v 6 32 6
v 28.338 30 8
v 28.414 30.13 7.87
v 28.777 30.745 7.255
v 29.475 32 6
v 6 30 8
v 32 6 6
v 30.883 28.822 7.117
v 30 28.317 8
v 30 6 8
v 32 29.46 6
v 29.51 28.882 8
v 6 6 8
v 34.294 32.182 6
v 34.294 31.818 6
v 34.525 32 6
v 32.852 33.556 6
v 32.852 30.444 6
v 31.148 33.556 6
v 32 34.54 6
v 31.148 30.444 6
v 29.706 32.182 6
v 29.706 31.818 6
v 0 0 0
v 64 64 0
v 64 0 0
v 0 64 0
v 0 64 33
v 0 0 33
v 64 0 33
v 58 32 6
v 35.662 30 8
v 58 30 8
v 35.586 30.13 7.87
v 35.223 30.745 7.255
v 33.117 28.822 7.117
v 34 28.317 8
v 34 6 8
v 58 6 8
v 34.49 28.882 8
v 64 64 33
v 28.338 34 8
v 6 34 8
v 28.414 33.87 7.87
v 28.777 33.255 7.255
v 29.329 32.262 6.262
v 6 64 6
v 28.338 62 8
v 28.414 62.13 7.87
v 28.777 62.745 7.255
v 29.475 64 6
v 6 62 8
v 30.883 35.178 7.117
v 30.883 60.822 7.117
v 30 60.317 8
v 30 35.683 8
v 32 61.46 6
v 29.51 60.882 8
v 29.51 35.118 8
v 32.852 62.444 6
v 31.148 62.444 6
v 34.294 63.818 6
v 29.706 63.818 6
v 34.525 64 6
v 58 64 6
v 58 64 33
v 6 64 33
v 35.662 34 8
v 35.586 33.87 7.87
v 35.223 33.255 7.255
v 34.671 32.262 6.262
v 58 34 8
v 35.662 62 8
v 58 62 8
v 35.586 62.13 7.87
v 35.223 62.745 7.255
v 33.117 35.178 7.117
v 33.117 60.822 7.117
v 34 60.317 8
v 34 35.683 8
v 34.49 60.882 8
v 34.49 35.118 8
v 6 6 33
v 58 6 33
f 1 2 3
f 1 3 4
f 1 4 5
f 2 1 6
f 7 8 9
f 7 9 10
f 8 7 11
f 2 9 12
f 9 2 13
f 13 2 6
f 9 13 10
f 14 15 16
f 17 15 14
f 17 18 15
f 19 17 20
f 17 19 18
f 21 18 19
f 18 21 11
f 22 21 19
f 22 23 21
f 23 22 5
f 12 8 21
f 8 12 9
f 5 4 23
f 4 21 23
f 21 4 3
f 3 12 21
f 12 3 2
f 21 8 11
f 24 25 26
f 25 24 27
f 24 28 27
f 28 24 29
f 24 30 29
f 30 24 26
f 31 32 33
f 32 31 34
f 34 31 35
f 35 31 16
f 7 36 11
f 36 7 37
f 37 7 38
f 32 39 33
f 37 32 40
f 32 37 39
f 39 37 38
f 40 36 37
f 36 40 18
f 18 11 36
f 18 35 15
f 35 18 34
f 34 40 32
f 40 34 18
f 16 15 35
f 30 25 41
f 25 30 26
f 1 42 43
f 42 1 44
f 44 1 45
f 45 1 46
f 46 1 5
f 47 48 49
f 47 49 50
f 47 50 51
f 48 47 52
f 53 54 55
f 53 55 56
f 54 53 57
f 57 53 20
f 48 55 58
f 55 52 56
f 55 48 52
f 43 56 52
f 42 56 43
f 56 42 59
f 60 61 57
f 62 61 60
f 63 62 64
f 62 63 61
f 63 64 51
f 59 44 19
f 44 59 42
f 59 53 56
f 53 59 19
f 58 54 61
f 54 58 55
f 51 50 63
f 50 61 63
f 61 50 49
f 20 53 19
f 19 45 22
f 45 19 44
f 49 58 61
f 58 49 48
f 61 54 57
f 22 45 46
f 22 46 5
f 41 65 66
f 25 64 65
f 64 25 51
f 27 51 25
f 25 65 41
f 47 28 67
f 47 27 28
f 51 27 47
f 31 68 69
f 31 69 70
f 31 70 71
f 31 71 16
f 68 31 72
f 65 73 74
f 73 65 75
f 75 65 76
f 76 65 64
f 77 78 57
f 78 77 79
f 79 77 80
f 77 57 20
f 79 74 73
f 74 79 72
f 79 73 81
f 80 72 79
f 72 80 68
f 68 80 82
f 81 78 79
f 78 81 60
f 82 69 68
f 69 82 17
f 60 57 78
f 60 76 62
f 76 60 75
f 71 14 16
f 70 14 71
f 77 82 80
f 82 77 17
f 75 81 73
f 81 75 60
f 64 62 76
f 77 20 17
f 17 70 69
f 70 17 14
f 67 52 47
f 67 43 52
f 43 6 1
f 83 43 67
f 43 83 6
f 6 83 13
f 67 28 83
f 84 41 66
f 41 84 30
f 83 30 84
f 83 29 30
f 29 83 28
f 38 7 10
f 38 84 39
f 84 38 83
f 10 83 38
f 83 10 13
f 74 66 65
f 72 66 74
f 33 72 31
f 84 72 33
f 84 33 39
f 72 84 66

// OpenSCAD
// file: WylochStyleDungeonLibrary.scad
size = 32;
baseheight = 6;
topperheight = 2;
topperrounded = true;
walllength = size;
wallheight = 25 + baseheight + topperheight;
wallwidth = 6;
wallwidththin = 4;

function hypotenuse_ra(side_a, side_b) =
    sqrt(pow(side_a, 2) + pow(side_b, 2));
    
module wsdl_Base(s,bh)
{
    cube([s,s,bh]);
}

module wsdl_Topper(s,bh,th,tr)
{
    if (tr) {
        translate([0,0,bh])
            intersection() {
                difference () {
                        cube([s,s,th]);
                        union () {
                        rotate(a=45, v=[1,0,0])
                            cube([s,th*2,th*2]);
                        translate([0,s,0])
                            rotate(a=45, v=[1,0,0])
                                cube([s,th*2,th*2]);
                        rotate(a=-45, v=[0,1,0])
                            cube([th*2,s,th*2]);
                        translate([s,0,0])
                            rotate(a=-45, v=[0,1,0])
                                cube([th*2,s,th*2]);
                        }
                }
                translate([s/2,s/2,0])
                    cylinder(
                        h=th, 
                        r1=hypotenuse_ra(s/2-1.2, s/2-1.2), 
                        r2=hypotenuse_ra(s/2-th-.8, s/2-th-.8), 
                        center=false, 
                        $fa=.1);
            }    
    }
    else {
        translate([0,0,bh])
            difference() {
                cube([s,s,th]);
                union () {
                rotate(a=45, v=[1,0,0])
                    cube([s,th*2,th*2]);
                translate([0,s,0])
                    rotate(a=45, v=[1,0,0])
                        cube([s,th*2,th*2]);
                rotate(a=-45, v=[0,1,0])
                    cube([th*2,s,th*2]);
                translate([s,0,0])
                    rotate(a=-45, v=[0,1,0])
                        cube([th*2,s,th*2]);
                }
            }    
    }
}

module wsdl_Base_1x1(s,bh,th,tr) 
{
    union () {
        wsdl_Base(s,bh);
        wsdl_Topper(s,bh,th,tr);
    }
}

module wsdl_Base_1x2(s,bh,th,tr)
{
    union () {
        wsdl_Base_1x1(s,bh,th,tr);
        translate([s,0,0])
            wsdl_Base_1x1(s,bh,th,tr);
    }
}
 
module wsdl_Base_2x2(s,bh,th,tr)
{
    union () {
        wsdl_Base_1x2(s,bh,th,tr);
        translate([0,s,0])
            wsdl_Base_1x2(s,bh,th,tr);
    }
}
 
module wsdl_Base_2x4(s,bh,th,tr)
{
    union () {
        wsdl_Base_2x2(s,bh,th,tr);
        translate([s*2,0,0])
            wsdl_Base_2x2(s,bh,th,tr);
    }
}
 
module wsdl_Base_4x4(s,bh,th,tr)
{
    union () {
        wsdl_Base_2x4(s,bh,th,tr);
        translate([0,s*2,0])
            wsdl_Base_2x4(s,bh,th,tr);
    }
}
 
module wsdl_Wall_1(w,l,h)
{
    cube([w,l,h]);   
}

module wsdl_Wall_2(w,l,h)
{
    union() {
        wsdl_Wall_1(w,l,h);
        translate([0,l,0])
            wsdl_Wall_1(w,l,h);
    }
}

module wsdl_Wall_1_Left(w,l,h) 
{
    wsdl_Wall_1(w,l,h);
}

module wsdl_Wall_1_Right(w,l,h) 
{
    translate([(size)-w,0,0])
        wsdl_Wall_1(w,l,h);
}

module wsdl_Wall_1_DoubleRight(w,l,h) 
{
    translate([(size*2)-w,0,0])
        wsdl_Wall_1(w,l,h);
}

module wsdl_Wall_1_Bottom(w,l,h) 
{
rotate(a=-90)
    translate([-w,0,0])
        wsdl_Wall_1(w,l,h);

}

module wsdl_Wall_1_Top(w,l,h) 
{
rotate(a=-90)
    translate([-l,0,0])
        wsdl_Wall_1(w,l,h);

}

module wsdl_Wall_1_Center(w,l,h) 
{
    translate([(size)-w/2,0,0])
        wsdl_Wall_1(w,l,h);
}


module wsdl_Wall_2_Left(w,l,h) 
{
    wsdl_Wall_2(w,l,h);
}

module wsdl_Wall_2_Right(w,l,h) 
{
    translate([(size*2)-w,0,0])
        wsdl_Wall_2(w,l,h);
}

module wsdl_Wall_2_Bottom(w,l,h) 
{
rotate(a=-90)
    translate([-w,0,0])
        wsdl_Wall_2(w,l,h);

}

module wsdl_Wall_2_Top(w,l,h) 
{
rotate(a=-90)
    translate([-l*2,0,0])
        wsdl_Wall_2(w,l,h);

}

module wsdl_Wall_2_Center(w,l,h) 
{
    translate([(size)-w/2,0,0])
        wsdl_Wall_2(w,l,h);
}
// main file
include <WylochStyleDungeonLibrary.scad>; 
 
wsdl_Base_2x2(size,baseheight,topperheight,topperrounded);
wsdl_Wall_2_Left(wallwidth,walllength,wallheight);
wsdl_Wall_2_Bottom(wallwidth,walllength,wallheight);
wsdl_Wall_2_Right(wallwidth,walllength,wallheight);
